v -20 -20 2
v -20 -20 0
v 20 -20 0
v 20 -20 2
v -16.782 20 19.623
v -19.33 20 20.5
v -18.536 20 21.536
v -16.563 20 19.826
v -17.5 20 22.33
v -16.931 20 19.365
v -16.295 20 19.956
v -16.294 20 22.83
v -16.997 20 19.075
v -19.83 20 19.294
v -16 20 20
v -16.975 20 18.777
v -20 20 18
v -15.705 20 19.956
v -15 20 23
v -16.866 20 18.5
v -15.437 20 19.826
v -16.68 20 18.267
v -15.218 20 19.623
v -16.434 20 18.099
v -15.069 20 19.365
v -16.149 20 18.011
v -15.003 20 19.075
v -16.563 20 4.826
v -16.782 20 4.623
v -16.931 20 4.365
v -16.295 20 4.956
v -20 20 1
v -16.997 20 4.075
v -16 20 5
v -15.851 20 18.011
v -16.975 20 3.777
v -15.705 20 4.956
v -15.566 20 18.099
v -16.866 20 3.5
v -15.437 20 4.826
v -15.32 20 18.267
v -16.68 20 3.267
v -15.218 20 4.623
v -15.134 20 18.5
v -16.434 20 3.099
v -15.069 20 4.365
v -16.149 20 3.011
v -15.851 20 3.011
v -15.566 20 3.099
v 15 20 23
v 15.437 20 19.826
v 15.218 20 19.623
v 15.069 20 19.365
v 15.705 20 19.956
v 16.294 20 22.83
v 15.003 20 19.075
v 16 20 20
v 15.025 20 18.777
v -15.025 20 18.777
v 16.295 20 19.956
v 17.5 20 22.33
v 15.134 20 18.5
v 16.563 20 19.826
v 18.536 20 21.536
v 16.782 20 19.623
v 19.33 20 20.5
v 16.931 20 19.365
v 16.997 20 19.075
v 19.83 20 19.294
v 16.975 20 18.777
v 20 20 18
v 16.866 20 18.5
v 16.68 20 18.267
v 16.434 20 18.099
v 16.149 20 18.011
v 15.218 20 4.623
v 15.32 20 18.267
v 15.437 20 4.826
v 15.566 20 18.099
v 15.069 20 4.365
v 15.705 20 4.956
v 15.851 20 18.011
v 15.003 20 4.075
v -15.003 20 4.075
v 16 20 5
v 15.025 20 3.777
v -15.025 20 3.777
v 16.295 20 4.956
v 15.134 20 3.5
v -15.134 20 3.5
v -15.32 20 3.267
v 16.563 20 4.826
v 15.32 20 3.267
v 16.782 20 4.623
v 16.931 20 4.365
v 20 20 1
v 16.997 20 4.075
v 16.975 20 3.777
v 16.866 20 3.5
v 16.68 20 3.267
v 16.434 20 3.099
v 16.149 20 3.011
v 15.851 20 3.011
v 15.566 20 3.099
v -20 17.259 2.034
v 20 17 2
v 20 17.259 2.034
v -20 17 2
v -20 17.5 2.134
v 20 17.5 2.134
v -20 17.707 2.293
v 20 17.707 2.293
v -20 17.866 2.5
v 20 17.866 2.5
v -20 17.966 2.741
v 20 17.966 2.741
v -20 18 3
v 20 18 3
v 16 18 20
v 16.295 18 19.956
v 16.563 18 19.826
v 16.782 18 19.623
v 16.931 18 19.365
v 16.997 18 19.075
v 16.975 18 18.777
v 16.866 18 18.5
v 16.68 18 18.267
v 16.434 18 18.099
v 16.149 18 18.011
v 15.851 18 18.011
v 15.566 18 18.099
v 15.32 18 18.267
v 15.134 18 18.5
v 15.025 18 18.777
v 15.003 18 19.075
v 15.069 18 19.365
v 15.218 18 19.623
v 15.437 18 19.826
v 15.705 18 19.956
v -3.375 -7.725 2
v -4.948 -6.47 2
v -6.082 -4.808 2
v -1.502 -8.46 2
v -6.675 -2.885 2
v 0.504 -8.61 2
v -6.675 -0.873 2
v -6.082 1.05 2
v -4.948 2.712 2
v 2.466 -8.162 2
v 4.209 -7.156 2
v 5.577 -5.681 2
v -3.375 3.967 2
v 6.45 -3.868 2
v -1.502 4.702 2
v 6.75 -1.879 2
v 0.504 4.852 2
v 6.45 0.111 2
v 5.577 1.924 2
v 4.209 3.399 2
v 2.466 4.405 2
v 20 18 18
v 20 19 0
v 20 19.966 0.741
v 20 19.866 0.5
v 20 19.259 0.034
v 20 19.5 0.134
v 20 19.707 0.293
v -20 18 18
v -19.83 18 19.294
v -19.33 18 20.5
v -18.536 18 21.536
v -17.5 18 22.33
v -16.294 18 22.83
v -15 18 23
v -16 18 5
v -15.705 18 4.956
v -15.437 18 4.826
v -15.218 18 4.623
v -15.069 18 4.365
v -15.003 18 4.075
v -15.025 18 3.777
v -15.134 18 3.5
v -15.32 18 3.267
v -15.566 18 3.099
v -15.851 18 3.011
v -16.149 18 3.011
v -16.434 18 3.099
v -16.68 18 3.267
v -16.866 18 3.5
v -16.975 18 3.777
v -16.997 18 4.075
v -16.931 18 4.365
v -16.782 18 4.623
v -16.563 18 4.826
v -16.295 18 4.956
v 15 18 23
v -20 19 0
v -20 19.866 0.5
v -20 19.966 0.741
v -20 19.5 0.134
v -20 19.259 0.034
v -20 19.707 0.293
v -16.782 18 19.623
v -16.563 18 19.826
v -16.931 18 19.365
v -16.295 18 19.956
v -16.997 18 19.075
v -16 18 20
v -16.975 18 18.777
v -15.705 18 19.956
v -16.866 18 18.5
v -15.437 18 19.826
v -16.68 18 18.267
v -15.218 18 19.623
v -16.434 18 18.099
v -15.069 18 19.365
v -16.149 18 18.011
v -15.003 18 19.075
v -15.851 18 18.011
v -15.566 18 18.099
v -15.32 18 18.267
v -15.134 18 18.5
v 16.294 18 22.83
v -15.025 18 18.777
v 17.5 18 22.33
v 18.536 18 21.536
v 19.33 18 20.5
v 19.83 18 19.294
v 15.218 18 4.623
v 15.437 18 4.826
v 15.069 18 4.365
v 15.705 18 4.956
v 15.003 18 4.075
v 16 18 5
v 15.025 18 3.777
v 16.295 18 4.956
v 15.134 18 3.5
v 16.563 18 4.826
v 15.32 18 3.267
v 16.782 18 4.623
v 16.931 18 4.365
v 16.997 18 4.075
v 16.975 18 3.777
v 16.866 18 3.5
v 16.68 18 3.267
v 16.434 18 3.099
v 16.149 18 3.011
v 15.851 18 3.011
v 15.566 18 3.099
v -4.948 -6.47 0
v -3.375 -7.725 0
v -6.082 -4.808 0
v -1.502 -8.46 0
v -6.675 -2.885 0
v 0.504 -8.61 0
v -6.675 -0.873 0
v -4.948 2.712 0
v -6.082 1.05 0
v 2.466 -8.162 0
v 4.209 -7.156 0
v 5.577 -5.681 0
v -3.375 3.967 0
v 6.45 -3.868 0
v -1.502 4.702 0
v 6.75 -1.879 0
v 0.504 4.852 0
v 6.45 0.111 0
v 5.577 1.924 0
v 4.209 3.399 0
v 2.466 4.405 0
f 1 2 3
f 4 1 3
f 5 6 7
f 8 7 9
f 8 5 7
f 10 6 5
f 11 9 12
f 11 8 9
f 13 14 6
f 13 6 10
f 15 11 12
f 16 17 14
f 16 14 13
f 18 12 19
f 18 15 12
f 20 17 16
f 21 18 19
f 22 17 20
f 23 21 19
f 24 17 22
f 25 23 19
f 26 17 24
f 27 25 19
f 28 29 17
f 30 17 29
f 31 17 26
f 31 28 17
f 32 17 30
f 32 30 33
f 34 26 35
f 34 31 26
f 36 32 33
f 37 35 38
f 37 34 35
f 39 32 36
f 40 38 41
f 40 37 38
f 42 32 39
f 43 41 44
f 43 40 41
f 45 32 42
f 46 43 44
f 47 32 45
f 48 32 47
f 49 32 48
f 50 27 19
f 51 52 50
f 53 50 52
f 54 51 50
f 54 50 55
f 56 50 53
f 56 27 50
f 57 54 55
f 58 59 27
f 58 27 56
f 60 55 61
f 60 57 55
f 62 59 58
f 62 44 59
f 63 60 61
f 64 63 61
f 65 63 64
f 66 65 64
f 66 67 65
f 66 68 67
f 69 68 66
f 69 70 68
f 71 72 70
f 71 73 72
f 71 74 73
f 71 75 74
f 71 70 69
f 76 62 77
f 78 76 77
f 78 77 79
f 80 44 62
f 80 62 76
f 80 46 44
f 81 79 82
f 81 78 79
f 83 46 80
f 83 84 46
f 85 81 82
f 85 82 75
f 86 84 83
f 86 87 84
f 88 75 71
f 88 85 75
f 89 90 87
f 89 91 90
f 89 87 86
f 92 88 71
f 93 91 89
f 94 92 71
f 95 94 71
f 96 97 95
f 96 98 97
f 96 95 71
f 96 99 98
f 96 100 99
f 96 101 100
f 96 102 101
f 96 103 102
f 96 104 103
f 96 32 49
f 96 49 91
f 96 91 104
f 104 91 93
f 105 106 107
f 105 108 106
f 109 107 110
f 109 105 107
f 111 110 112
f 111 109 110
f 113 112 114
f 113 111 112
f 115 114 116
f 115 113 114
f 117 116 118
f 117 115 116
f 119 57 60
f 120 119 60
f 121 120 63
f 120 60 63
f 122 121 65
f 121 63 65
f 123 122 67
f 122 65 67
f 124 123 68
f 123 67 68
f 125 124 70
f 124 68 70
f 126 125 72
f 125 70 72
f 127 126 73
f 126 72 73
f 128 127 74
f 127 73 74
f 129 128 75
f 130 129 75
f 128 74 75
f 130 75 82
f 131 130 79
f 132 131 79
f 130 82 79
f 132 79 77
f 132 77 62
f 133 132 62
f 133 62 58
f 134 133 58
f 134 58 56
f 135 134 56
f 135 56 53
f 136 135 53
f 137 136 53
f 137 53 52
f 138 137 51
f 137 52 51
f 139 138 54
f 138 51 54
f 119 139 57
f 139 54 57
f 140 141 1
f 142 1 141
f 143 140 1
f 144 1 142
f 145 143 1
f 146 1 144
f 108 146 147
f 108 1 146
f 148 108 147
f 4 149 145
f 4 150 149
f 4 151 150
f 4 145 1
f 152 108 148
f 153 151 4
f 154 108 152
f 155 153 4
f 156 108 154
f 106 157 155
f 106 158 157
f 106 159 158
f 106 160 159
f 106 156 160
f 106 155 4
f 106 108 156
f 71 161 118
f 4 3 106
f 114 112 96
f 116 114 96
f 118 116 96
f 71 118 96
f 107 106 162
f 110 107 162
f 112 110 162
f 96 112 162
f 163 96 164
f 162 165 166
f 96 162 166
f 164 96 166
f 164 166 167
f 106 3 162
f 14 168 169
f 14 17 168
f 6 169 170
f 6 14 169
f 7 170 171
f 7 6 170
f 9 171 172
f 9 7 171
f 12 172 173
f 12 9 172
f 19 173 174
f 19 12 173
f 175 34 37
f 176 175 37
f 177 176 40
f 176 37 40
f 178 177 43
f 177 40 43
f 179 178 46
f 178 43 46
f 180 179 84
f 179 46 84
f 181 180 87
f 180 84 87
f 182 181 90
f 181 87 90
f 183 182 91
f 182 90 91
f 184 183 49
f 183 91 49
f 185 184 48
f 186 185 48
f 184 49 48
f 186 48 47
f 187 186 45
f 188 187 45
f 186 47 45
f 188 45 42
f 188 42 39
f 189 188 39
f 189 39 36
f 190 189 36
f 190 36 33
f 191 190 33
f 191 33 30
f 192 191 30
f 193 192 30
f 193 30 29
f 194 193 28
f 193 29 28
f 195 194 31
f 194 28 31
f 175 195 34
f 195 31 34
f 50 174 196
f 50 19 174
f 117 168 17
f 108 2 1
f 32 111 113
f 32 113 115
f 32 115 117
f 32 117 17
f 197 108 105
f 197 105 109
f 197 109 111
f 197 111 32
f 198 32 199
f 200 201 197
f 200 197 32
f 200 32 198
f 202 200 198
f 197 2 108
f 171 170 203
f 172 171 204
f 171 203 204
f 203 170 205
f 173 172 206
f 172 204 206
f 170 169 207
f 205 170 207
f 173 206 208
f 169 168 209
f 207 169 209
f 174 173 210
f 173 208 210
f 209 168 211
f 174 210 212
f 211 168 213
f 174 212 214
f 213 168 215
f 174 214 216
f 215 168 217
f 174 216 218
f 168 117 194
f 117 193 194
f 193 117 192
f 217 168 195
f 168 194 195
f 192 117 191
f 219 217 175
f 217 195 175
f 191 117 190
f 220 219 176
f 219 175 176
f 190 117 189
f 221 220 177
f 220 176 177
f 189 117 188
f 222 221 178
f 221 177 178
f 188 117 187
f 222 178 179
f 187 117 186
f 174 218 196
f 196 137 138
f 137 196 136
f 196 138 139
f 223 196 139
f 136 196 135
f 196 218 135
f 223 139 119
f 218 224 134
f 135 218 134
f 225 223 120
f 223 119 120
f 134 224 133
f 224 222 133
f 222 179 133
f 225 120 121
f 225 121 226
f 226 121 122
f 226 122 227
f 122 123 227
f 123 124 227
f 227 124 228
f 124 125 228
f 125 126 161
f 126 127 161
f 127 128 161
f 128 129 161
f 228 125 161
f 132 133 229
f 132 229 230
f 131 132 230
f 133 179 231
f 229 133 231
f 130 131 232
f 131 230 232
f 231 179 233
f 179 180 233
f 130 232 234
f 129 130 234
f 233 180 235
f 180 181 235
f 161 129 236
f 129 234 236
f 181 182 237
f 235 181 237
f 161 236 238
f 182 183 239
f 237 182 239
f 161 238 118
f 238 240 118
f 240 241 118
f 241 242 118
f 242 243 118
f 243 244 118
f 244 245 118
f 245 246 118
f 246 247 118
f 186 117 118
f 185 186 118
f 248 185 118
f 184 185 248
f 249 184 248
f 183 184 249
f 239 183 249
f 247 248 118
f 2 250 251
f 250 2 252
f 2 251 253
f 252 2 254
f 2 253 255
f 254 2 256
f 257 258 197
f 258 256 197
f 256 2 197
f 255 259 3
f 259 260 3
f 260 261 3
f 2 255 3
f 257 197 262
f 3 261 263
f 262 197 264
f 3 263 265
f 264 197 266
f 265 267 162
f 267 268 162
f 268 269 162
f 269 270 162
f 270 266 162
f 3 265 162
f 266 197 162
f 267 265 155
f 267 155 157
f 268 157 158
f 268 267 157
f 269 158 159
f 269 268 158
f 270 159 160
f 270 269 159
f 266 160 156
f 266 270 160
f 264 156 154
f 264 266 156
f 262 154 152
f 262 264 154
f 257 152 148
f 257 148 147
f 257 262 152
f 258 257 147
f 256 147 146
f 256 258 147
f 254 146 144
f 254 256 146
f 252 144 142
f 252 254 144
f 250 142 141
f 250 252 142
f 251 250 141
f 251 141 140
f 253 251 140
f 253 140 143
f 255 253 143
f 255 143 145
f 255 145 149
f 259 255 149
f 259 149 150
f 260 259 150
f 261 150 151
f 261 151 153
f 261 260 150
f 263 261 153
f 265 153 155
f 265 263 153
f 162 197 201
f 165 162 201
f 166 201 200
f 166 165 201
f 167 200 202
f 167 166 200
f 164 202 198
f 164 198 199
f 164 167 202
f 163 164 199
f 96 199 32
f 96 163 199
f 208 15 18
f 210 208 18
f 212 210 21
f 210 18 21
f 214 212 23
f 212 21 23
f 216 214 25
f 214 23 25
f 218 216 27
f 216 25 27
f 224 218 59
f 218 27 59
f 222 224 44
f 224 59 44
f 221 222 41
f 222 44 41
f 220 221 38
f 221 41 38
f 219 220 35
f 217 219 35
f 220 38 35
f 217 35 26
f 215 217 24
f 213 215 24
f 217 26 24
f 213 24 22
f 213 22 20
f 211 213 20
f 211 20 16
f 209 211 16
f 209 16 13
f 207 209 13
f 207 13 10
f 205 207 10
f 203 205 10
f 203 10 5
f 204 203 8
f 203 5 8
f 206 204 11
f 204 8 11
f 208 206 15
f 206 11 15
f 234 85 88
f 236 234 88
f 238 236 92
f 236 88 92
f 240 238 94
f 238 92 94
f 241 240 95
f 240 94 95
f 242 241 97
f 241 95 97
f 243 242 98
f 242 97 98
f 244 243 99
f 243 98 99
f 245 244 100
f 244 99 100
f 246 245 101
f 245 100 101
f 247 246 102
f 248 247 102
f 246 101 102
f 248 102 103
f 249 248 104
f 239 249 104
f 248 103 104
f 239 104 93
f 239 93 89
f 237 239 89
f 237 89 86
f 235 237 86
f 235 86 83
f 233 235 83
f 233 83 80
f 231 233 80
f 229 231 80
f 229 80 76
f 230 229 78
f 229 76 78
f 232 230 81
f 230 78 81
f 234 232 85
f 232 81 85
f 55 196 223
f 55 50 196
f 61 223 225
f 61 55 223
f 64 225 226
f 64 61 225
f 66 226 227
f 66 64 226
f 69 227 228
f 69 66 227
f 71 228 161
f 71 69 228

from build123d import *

# Parameters (mm, degrees)
SKETCH1_W           = 40
SKETCH1_H           = 40
SKETCH1_R           = 6.75
BOSS_EXTRUDE2_DEPTH = 2
SKETCH2_W           = 40
SKETCH2_H           = 2
BOSS_EXTRUDE3_DEPTH = 23
SKETCH3_R           = 1
CUT_EXTRUDE1_DEPTH  = 2
FILLET1_R           = 1
FILLET2_R           = 1
FILLET3_R           = 5


with BuildPart() as part:
    # Sketch1 → Boss-Extrude2 (new body)
    with BuildSketch(Plane.XY):
        Rectangle(SKETCH1_W, SKETCH1_H)
        with Locations((0, -1.878854291)):
            Circle(SKETCH1_R, mode=Mode.SUBTRACT)
    extrude(amount=BOSS_EXTRUDE2_DEPTH)

    # Sketch2 → Boss-Extrude3 (add)
    with BuildSketch(Plane.XY):
        with Locations((0, 19)):
            Rectangle(SKETCH2_W, SKETCH2_H)
    extrude(amount=BOSS_EXTRUDE3_DEPTH)

    # Sketch3 → Cut-Extrude1 (cut)
    with BuildSketch(Plane(origin=(0, 20, 0), x_dir=(1, 0, 0), z_dir=(0, 1, 0))):
        with Locations(Location((-16, -4, 0), (0, 0, 270))):
            Circle(SKETCH3_R)
        with Locations(Location((16, -4, 0), (0, 0, 270))):
            Circle(SKETCH3_R)
        with Locations(Location((16, -19, 0), (0, 0, 270))):
            Circle(SKETCH3_R)
        with Locations(Location((-16, -19, 0), (0, 0, 270))):
            Circle(SKETCH3_R)
    extrude(amount=-CUT_EXTRUDE1_DEPTH, mode=Mode.SUBTRACT)

    # Fillet1
    fillet1_edges = [part.edges().sort_by_distance(p)[0] for p in [
        (0, 20, 0),
    ]]
    fillet(fillet1_edges, radius=FILLET1_R)

    # Fillet2
    fillet2_edges = [part.edges().sort_by_distance(p)[0] for p in [
        (0, 18, 2),
    ]]
    fillet(fillet2_edges, radius=FILLET2_R - 0.0001)  # a hair under: the kernel refuses the full size

    # Fillet3
    fillet3_edges = [part.edges().sort_by_distance(p)[0] for p in [
        (-20, 19, 23),
        (20, 19, 23),
    ]]
    fillet(fillet3_edges, radius=FILLET3_R)


solid = part.part
